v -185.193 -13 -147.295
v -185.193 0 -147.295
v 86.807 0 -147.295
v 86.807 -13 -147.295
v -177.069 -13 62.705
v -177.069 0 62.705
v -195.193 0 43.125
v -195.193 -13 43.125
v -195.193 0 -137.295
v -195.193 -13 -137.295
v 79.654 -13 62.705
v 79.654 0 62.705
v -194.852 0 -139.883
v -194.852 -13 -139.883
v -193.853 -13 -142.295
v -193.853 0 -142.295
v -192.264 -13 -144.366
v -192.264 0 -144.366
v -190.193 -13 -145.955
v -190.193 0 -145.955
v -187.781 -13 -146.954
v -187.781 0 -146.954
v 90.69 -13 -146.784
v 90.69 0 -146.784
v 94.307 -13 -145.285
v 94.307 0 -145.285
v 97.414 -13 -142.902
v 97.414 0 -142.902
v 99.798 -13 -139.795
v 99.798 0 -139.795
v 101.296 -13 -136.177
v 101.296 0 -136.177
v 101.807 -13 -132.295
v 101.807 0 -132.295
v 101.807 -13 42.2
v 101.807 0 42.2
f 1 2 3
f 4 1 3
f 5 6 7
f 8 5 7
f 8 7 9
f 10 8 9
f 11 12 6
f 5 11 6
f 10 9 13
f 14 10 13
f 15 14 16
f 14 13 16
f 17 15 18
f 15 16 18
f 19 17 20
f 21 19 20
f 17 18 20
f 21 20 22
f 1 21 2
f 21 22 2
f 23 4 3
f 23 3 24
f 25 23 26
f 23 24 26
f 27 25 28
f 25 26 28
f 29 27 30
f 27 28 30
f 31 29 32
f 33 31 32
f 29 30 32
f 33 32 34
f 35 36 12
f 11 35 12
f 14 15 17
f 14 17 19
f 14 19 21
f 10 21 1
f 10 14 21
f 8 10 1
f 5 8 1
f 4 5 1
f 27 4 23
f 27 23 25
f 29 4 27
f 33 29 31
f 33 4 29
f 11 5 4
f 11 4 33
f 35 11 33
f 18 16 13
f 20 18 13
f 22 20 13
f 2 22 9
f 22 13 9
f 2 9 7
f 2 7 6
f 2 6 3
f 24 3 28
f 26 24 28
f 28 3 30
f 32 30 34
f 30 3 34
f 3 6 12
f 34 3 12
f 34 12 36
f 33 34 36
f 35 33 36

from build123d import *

# Parameters (mm, degrees)
F0_W     = 120
F0_H     = 10
F0_H_2   = 43
F0_H_3   = 15
F1_DEPTH = 13


with BuildPart() as f1:
    # F0 (on Front) → F1 (new body)
    with BuildSketch(Plane.XZ):
        with BuildLine():
            Line((79.65406, 62.704971), (-177.068964, 62.704971))
            Line((-177.068964, 62.704971), (-195.192658, 43.124754))
            Line((-195.192658, 43.124754), (-195.192658, -82.32457))
            Line((-195.192658, -82.32457), (-75.192658, -82.32457))
            Line((-75.192658, -82.32457), (-75.192658, -92.32457))
            Line((-75.192658, -92.32457), (-195.192658, -92.32457))
            Line((-195.192658, -92.32457), (-195.192658, -109.70904))
            Line((-195.192658, -109.70904), (-75.192658, -109.70904))
            Line((-75.192658, -109.70904), (-75.192658, -124.70904))
            Line((-75.192658, -124.70904), (-195.192658, -124.70904))
            Line((-195.192658, -124.70904), (-195.192658, -137.295029))
            ThreePointArc((-195.192658, -137.295029), (-192.263725, -144.366097), (-185.192658, -147.295029))
            Line((-185.192658, -147.295029), (86.807342, -147.295029))
            ThreePointArc((86.807342, -147.295029), (97.413944, -142.90163), (101.807342, -132.295029))
            Line((101.807342, -132.295029), (101.807342, -125.32457))
            Line((101.807342, -125.32457), (-18.192658, -125.32457))
            Line((-18.192658, -125.32457), (-18.192658, -82.32457))
            Line((-18.192658, -82.32457), (101.807342, -82.32457))
            Line((101.807342, -82.32457), (101.807342, 42.199616))
            Line((101.807342, 42.199616), (79.65406, 62.704971))
        make_face()
        with Locations((-135.192658, -87.32457)):
            Rectangle(F0_W, F0_H)
        with Locations((41.807342, -103.82457)):
            Rectangle(F0_W, F0_H_2)
        with Locations((-135.192658, -117.20904)):
            Rectangle(F0_W, F0_H_3)
    extrude(amount=F1_DEPTH)


solid = f1.part
